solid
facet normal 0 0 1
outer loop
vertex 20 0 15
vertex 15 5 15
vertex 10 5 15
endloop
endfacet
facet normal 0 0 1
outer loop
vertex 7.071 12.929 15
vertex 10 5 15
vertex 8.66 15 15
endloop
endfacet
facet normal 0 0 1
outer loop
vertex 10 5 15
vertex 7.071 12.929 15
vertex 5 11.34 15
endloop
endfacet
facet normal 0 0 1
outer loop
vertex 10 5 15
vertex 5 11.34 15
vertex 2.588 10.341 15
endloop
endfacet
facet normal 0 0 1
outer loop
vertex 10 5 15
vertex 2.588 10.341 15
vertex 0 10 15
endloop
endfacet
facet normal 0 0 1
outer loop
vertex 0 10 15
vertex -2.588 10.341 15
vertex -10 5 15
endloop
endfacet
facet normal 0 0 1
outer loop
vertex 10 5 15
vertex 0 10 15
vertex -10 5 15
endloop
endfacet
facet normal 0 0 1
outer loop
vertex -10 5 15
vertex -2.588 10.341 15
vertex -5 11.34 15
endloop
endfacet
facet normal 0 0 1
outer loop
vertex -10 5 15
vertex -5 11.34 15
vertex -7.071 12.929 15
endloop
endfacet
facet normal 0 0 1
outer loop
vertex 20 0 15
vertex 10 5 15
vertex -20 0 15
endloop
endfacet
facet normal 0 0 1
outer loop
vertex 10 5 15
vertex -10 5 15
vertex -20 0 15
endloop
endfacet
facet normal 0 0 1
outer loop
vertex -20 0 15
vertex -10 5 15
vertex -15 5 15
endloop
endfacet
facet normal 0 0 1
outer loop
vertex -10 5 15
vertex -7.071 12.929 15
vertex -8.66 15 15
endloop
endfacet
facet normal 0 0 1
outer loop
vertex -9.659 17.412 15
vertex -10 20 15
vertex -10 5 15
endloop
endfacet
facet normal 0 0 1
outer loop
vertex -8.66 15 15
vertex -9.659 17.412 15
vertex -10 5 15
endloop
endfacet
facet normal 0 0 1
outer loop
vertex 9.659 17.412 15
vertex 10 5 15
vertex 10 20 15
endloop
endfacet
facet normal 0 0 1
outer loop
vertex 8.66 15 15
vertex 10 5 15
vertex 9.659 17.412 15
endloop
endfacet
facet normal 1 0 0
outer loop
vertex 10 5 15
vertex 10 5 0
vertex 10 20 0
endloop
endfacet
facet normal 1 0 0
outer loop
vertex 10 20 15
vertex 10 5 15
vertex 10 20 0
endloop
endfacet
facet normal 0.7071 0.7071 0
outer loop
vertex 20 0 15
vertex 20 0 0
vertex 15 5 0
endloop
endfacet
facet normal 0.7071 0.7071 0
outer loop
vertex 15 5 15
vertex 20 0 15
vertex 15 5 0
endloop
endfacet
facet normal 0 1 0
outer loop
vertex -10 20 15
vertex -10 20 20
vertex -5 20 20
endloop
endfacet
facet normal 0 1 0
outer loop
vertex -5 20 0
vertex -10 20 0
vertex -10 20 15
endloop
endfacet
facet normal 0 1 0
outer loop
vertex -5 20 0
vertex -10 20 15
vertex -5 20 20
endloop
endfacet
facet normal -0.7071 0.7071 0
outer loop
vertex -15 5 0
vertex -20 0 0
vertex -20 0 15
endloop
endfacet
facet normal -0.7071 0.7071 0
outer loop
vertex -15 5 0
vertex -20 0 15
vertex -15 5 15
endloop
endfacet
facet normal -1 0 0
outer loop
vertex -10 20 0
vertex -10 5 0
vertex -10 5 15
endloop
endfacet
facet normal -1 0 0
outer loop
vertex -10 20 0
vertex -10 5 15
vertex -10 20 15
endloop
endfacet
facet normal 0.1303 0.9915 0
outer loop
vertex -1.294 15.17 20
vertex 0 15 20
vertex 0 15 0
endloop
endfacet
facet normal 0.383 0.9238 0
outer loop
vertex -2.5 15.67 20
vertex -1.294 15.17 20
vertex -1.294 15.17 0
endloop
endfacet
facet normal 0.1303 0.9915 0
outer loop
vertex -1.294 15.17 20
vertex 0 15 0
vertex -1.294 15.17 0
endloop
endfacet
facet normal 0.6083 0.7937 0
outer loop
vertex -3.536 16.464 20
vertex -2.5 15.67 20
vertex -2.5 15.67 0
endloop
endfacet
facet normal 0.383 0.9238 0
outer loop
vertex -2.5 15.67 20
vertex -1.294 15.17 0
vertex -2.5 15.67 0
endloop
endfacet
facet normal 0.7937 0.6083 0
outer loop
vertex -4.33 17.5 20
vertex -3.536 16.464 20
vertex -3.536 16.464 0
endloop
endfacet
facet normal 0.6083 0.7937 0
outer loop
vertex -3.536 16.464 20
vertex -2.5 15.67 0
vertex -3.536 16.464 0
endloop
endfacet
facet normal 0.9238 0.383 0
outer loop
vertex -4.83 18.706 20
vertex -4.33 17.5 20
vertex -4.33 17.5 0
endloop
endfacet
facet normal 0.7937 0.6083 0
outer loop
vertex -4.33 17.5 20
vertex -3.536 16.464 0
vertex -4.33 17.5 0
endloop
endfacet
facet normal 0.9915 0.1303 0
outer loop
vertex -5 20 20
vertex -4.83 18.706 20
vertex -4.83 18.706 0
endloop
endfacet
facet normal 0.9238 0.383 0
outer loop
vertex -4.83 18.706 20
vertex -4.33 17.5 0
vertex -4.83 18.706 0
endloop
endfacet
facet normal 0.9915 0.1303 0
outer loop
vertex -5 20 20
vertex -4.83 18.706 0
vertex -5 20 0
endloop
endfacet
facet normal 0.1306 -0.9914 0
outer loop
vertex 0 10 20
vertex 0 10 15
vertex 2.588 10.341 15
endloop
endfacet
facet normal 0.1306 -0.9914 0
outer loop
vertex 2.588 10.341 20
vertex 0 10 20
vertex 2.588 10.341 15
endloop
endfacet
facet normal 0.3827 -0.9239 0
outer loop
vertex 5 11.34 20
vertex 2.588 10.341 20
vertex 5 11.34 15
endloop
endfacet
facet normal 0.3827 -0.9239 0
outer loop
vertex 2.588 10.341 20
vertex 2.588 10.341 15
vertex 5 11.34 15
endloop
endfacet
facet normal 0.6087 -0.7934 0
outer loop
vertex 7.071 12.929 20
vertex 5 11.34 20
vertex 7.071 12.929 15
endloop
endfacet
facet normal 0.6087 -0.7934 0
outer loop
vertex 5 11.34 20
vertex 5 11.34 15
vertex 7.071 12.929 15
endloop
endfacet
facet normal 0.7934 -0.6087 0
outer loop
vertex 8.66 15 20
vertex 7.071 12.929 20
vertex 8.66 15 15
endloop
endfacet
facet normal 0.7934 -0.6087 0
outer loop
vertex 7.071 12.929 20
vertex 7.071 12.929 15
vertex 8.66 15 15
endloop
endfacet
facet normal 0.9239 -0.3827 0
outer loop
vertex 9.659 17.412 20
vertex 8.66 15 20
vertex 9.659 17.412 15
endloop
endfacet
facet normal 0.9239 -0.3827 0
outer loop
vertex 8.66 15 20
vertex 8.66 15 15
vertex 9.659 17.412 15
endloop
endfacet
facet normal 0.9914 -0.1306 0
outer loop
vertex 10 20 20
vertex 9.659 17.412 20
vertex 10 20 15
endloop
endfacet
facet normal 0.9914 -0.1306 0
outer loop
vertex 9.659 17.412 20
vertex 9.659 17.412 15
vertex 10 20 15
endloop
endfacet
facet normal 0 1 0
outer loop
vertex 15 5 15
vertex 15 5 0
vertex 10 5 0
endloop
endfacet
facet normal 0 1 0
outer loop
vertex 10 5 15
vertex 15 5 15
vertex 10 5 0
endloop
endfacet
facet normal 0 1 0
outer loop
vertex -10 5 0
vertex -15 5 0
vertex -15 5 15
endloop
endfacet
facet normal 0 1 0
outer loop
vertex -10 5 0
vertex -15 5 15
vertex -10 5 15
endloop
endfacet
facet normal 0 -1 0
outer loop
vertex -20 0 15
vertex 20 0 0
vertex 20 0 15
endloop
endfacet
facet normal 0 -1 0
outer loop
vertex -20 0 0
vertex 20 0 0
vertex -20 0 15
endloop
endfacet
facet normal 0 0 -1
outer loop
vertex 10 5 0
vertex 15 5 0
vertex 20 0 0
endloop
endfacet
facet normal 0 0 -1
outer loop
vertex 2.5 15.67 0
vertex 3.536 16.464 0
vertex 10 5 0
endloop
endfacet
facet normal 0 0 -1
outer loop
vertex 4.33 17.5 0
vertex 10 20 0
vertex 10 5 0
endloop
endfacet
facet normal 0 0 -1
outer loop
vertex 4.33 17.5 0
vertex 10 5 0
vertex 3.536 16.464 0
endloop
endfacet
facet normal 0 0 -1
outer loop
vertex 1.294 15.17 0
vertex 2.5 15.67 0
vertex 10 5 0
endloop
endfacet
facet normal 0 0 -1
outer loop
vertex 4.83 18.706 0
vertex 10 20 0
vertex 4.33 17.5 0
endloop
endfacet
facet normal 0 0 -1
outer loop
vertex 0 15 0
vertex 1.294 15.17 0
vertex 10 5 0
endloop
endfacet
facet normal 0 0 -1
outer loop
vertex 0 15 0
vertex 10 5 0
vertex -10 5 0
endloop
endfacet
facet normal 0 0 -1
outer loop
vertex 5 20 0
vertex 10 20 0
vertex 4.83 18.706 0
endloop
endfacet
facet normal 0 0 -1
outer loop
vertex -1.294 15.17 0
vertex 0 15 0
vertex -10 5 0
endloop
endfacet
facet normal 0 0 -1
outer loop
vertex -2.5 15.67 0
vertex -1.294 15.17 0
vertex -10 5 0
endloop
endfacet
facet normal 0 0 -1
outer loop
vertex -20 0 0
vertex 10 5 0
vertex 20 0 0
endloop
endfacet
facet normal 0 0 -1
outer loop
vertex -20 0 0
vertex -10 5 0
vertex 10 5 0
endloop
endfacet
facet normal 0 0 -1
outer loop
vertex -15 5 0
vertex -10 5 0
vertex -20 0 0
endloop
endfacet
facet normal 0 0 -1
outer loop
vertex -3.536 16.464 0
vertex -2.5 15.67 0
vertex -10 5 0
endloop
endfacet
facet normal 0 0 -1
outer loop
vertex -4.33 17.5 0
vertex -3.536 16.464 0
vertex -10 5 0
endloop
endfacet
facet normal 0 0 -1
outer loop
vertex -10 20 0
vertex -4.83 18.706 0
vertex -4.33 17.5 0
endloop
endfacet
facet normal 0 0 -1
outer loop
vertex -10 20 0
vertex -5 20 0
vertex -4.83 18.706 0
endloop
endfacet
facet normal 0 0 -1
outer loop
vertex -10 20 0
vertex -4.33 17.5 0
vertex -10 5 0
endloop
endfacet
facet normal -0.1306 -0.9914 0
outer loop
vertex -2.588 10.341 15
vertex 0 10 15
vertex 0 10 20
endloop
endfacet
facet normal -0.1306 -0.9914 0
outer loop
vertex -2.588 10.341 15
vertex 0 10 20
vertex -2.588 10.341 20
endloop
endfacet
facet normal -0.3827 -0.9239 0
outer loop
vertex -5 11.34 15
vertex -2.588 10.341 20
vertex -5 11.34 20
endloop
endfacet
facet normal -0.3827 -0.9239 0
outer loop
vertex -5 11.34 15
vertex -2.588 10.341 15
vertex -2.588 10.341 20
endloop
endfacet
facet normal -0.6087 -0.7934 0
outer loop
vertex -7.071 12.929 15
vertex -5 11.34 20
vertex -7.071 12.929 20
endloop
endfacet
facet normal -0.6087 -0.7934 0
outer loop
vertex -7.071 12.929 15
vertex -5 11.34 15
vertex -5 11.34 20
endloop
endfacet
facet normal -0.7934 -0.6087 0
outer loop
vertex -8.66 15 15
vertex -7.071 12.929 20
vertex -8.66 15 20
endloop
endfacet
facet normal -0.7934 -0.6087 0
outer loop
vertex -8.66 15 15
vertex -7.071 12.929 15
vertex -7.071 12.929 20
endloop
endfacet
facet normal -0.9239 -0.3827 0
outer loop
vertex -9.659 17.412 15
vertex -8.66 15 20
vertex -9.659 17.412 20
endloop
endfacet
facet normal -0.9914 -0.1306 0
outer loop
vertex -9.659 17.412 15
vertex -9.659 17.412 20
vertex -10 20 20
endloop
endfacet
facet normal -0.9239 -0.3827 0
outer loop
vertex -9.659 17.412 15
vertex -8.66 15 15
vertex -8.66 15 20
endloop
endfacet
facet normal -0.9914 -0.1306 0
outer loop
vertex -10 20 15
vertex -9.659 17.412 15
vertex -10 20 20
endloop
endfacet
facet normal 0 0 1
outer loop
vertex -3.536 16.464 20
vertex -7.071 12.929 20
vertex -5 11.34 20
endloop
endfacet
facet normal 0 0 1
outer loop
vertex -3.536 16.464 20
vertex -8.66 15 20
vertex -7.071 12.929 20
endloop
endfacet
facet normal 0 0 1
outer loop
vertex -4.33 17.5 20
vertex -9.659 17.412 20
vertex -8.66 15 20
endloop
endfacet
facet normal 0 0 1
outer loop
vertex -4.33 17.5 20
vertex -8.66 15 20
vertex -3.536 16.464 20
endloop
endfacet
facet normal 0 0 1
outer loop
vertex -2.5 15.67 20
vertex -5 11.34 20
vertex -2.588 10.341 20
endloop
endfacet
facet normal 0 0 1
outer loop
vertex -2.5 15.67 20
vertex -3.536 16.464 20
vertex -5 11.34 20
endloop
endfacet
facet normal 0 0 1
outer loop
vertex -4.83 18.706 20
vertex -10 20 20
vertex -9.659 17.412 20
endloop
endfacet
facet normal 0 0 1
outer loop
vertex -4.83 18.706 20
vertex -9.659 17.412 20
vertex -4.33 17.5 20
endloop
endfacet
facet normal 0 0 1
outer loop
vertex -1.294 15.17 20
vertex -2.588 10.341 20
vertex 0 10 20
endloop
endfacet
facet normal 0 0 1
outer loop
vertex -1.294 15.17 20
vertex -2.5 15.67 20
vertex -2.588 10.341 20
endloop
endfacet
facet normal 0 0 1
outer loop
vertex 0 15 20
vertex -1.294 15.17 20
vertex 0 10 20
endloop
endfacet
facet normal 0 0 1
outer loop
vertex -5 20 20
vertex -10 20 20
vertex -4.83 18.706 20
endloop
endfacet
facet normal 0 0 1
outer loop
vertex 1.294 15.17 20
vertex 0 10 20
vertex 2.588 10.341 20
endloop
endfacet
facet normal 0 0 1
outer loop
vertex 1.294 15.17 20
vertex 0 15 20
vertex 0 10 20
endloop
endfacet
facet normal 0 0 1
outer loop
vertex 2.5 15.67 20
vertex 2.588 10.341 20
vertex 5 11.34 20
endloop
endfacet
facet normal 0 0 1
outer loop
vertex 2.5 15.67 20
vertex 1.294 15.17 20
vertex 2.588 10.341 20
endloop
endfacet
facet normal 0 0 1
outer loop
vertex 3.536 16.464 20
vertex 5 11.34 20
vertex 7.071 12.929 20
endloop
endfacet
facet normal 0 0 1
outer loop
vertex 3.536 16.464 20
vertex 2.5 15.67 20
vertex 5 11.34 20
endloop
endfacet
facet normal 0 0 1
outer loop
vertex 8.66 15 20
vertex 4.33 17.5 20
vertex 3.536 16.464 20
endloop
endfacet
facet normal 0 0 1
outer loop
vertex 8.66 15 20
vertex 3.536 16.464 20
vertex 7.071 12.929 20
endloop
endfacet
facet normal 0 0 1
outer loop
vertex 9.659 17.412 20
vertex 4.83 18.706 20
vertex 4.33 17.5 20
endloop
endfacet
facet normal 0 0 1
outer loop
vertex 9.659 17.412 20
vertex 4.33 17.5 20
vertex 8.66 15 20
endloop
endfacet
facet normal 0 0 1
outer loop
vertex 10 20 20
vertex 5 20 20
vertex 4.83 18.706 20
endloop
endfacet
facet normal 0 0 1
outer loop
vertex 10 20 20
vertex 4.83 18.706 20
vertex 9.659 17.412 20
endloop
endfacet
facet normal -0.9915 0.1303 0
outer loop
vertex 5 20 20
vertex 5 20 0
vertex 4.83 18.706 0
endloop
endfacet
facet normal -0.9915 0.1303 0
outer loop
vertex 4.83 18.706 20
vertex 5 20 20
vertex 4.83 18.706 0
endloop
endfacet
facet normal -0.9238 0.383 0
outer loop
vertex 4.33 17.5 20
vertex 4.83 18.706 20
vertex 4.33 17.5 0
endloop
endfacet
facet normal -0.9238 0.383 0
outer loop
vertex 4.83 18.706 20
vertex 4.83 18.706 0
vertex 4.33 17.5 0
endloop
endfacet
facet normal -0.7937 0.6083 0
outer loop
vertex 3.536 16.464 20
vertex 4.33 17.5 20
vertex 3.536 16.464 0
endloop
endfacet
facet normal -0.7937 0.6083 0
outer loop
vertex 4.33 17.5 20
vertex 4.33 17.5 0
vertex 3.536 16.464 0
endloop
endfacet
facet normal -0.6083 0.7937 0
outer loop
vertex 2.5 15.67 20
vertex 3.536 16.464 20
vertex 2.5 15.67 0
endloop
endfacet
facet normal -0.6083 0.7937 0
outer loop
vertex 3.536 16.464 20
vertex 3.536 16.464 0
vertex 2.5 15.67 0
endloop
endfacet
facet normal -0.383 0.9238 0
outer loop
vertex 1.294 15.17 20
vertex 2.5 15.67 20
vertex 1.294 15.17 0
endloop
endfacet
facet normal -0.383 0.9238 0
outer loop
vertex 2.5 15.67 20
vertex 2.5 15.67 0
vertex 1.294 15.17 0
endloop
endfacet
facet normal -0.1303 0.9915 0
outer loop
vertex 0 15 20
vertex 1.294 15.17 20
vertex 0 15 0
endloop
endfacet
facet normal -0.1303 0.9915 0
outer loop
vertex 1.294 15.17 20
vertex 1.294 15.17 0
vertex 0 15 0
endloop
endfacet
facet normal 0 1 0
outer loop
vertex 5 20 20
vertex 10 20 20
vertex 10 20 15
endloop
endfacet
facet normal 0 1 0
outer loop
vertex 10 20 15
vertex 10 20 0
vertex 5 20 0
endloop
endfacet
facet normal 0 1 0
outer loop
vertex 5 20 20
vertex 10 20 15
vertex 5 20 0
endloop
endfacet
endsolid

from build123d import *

# Parameters (mm, degrees)
EXTRUDE_1_DEPTH     = 15
EXTRUDE_2_DEPTH     = 20
CUT_EXTRUDE_1_DEPTH = 20


with BuildPart() as part:
    # 草圖1 → 填料-伸長1 (new body)
    with BuildSketch(Plane.XY):
        Polygon((0, 0), (20, 0), (15, 5), (10, 5), (10, 20), (0, 20), align=None)
    extrude_1 = extrude(amount=EXTRUDE_1_DEPTH)

    # 草圖2 → 填料-伸長2 (add)
    with BuildSketch(Plane.XY):
        with BuildLine():
            ThreePointArc((0, 10), (7.071067812, 12.928932188), (10, 20))
            Line((10, 20), (5, 20))
            ThreePointArc((5, 20), (3.535533906, 16.464466094), (0, 15))
            Line((0, 15), (0, 10))
        make_face()
    extrude_2 = extrude(amount=EXTRUDE_2_DEPTH)

    # 草圖2<3> → 除料-伸長1 (cut)
    with BuildSketch(Plane.XY):
        with BuildLine():
            ThreePointArc((0, 15), (3.535533906, 16.464466094), (5, 20))
            Line((5, 20), (0, 20))
            Line((0, 20), (0, 15))
        make_face()
    cut_extrude_1 = extrude(amount=CUT_EXTRUDE_1_DEPTH, mode=Mode.SUBTRACT)

    # 鏡射1: 填料-伸長1, 填料-伸長2, 除料-伸長1 across plane
    add(extrude_1.mirror(Plane(origin=(0, 0, 0), x_dir=(0, 0, 1), z_dir=(1, 0, 0))))
    add(extrude_2.mirror(Plane(origin=(0, 0, 0), x_dir=(0, 0, 1), z_dir=(1, 0, 0))))
    add(cut_extrude_1.mirror(Plane(origin=(0, 0, 0), x_dir=(0, 0, 1), z_dir=(1, 0, 0))), mode=Mode.SUBTRACT)


solid = part.part
